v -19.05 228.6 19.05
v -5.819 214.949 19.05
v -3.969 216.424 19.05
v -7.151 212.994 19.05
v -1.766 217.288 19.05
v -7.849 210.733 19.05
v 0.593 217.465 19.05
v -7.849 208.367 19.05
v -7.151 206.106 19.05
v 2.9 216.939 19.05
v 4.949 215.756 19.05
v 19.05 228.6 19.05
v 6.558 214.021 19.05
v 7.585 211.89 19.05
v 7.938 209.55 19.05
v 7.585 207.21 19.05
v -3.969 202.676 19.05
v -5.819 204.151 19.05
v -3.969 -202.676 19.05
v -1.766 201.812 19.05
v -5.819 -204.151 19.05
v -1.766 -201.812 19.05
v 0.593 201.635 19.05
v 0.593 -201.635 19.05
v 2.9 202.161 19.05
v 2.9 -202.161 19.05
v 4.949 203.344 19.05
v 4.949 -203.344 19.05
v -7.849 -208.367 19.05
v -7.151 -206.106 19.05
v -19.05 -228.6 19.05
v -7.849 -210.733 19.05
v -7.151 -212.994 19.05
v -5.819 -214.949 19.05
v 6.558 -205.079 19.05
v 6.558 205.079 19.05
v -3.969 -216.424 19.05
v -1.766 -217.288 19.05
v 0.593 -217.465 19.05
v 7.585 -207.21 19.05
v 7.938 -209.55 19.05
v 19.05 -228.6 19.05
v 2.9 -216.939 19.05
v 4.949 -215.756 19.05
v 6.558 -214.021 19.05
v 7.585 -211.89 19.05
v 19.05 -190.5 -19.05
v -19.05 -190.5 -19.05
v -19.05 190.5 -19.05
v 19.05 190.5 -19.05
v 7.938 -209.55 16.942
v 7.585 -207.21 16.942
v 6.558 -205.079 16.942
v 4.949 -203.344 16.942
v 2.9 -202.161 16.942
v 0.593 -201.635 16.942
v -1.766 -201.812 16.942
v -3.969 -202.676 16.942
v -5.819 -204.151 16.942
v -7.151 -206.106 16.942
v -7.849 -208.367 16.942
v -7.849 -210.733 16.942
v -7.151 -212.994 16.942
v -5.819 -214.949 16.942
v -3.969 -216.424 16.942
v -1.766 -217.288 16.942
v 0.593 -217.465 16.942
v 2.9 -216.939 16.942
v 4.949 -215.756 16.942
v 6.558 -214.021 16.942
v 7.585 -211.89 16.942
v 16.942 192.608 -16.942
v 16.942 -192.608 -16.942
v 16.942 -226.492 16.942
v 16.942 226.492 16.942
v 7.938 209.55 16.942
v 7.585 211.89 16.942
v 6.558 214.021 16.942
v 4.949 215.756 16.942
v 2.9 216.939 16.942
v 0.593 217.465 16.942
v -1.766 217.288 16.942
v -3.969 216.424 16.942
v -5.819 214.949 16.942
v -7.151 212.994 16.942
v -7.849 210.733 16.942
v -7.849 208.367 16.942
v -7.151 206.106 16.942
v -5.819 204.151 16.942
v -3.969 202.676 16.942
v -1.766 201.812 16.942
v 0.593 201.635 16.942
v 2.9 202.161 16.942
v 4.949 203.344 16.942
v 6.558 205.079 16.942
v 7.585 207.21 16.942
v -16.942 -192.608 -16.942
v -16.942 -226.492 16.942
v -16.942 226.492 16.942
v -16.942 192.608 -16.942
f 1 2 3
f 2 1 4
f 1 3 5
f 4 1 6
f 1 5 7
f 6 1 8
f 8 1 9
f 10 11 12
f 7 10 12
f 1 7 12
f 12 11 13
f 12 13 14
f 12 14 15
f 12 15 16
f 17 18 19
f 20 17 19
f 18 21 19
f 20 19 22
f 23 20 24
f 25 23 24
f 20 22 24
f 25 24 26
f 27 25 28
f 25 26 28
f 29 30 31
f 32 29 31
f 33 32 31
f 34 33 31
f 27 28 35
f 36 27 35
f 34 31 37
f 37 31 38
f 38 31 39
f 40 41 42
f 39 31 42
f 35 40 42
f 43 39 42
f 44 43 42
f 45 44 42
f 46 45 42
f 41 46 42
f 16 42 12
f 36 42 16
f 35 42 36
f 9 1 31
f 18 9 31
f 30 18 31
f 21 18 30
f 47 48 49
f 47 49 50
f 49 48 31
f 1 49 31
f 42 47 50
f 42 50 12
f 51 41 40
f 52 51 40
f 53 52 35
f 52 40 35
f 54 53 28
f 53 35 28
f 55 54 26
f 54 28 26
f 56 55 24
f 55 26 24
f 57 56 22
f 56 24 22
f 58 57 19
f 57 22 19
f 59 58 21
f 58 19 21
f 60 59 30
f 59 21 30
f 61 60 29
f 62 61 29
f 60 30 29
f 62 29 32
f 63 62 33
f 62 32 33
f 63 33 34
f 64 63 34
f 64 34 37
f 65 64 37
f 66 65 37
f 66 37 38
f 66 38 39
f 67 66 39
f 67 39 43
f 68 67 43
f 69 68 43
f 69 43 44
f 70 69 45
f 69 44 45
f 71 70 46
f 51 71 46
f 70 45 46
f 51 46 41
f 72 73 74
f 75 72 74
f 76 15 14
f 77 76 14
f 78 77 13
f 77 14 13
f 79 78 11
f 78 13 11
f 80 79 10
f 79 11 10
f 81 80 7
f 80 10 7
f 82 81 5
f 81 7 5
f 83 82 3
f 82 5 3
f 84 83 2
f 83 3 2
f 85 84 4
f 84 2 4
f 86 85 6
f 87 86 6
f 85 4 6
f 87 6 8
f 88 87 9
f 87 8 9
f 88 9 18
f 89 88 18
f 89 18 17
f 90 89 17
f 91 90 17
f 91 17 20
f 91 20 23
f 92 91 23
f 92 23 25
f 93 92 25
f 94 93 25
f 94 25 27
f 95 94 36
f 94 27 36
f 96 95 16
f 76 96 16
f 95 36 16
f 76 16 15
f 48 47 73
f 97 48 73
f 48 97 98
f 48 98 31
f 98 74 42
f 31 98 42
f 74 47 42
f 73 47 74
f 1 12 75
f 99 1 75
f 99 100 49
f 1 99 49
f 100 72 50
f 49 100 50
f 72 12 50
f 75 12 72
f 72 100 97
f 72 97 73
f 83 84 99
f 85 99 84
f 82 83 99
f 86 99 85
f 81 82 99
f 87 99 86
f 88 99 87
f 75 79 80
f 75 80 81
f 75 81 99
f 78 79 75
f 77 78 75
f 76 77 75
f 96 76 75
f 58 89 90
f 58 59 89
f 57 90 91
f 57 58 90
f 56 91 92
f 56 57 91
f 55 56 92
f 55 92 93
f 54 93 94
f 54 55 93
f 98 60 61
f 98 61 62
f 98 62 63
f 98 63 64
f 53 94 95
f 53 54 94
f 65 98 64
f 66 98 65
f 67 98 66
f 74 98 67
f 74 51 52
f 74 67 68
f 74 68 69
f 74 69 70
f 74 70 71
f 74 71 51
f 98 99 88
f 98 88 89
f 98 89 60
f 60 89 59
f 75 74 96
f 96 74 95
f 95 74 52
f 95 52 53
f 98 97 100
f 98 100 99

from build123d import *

# Parameters (mm, degrees)
F0_W     = 38.1
F0_H     = 38.1
F0_W_2   = 33.8836
F0_H_2   = 33.8836
F1_DEPTH = 228.6
F3_DEPTH = 38.101
F4_R     = 7.9375
F5_DEPTH = 2.1082


with BuildPart() as f1:
    # F0 (on Front) → F1 (new body, symmetric)
    with BuildSketch(Plane.XZ):
        Rectangle(F0_W, F0_H)
        Rectangle(F0_W_2, F0_H_2, mode=Mode.SUBTRACT)
    extrude(amount=F1_DEPTH, both=True)

    # F2 (on face) → F3 (cut, through all)
    with BuildSketch(Plane.YZ.offset(19.05)):
        Polygon((-190.5, -19.05), (-228.6, 19.05), (-228.6, -19.05), align=None)
        Polygon((228.6, -19.05), (228.6, 19.05), (190.5, -19.05), align=None)
    extrude(amount=-F3_DEPTH, mode=Mode.SUBTRACT)

    # F4 (on face) → F5 (cut, through all)
    with BuildSketch(Plane.XY.offset(19.05)):
        with Locations((0, 209.55)):
            Circle(F4_R)
        with Locations((0, -209.55)):
            Circle(F4_R)
    extrude(amount=-F5_DEPTH, mode=Mode.SUBTRACT)


solid = f1.part
